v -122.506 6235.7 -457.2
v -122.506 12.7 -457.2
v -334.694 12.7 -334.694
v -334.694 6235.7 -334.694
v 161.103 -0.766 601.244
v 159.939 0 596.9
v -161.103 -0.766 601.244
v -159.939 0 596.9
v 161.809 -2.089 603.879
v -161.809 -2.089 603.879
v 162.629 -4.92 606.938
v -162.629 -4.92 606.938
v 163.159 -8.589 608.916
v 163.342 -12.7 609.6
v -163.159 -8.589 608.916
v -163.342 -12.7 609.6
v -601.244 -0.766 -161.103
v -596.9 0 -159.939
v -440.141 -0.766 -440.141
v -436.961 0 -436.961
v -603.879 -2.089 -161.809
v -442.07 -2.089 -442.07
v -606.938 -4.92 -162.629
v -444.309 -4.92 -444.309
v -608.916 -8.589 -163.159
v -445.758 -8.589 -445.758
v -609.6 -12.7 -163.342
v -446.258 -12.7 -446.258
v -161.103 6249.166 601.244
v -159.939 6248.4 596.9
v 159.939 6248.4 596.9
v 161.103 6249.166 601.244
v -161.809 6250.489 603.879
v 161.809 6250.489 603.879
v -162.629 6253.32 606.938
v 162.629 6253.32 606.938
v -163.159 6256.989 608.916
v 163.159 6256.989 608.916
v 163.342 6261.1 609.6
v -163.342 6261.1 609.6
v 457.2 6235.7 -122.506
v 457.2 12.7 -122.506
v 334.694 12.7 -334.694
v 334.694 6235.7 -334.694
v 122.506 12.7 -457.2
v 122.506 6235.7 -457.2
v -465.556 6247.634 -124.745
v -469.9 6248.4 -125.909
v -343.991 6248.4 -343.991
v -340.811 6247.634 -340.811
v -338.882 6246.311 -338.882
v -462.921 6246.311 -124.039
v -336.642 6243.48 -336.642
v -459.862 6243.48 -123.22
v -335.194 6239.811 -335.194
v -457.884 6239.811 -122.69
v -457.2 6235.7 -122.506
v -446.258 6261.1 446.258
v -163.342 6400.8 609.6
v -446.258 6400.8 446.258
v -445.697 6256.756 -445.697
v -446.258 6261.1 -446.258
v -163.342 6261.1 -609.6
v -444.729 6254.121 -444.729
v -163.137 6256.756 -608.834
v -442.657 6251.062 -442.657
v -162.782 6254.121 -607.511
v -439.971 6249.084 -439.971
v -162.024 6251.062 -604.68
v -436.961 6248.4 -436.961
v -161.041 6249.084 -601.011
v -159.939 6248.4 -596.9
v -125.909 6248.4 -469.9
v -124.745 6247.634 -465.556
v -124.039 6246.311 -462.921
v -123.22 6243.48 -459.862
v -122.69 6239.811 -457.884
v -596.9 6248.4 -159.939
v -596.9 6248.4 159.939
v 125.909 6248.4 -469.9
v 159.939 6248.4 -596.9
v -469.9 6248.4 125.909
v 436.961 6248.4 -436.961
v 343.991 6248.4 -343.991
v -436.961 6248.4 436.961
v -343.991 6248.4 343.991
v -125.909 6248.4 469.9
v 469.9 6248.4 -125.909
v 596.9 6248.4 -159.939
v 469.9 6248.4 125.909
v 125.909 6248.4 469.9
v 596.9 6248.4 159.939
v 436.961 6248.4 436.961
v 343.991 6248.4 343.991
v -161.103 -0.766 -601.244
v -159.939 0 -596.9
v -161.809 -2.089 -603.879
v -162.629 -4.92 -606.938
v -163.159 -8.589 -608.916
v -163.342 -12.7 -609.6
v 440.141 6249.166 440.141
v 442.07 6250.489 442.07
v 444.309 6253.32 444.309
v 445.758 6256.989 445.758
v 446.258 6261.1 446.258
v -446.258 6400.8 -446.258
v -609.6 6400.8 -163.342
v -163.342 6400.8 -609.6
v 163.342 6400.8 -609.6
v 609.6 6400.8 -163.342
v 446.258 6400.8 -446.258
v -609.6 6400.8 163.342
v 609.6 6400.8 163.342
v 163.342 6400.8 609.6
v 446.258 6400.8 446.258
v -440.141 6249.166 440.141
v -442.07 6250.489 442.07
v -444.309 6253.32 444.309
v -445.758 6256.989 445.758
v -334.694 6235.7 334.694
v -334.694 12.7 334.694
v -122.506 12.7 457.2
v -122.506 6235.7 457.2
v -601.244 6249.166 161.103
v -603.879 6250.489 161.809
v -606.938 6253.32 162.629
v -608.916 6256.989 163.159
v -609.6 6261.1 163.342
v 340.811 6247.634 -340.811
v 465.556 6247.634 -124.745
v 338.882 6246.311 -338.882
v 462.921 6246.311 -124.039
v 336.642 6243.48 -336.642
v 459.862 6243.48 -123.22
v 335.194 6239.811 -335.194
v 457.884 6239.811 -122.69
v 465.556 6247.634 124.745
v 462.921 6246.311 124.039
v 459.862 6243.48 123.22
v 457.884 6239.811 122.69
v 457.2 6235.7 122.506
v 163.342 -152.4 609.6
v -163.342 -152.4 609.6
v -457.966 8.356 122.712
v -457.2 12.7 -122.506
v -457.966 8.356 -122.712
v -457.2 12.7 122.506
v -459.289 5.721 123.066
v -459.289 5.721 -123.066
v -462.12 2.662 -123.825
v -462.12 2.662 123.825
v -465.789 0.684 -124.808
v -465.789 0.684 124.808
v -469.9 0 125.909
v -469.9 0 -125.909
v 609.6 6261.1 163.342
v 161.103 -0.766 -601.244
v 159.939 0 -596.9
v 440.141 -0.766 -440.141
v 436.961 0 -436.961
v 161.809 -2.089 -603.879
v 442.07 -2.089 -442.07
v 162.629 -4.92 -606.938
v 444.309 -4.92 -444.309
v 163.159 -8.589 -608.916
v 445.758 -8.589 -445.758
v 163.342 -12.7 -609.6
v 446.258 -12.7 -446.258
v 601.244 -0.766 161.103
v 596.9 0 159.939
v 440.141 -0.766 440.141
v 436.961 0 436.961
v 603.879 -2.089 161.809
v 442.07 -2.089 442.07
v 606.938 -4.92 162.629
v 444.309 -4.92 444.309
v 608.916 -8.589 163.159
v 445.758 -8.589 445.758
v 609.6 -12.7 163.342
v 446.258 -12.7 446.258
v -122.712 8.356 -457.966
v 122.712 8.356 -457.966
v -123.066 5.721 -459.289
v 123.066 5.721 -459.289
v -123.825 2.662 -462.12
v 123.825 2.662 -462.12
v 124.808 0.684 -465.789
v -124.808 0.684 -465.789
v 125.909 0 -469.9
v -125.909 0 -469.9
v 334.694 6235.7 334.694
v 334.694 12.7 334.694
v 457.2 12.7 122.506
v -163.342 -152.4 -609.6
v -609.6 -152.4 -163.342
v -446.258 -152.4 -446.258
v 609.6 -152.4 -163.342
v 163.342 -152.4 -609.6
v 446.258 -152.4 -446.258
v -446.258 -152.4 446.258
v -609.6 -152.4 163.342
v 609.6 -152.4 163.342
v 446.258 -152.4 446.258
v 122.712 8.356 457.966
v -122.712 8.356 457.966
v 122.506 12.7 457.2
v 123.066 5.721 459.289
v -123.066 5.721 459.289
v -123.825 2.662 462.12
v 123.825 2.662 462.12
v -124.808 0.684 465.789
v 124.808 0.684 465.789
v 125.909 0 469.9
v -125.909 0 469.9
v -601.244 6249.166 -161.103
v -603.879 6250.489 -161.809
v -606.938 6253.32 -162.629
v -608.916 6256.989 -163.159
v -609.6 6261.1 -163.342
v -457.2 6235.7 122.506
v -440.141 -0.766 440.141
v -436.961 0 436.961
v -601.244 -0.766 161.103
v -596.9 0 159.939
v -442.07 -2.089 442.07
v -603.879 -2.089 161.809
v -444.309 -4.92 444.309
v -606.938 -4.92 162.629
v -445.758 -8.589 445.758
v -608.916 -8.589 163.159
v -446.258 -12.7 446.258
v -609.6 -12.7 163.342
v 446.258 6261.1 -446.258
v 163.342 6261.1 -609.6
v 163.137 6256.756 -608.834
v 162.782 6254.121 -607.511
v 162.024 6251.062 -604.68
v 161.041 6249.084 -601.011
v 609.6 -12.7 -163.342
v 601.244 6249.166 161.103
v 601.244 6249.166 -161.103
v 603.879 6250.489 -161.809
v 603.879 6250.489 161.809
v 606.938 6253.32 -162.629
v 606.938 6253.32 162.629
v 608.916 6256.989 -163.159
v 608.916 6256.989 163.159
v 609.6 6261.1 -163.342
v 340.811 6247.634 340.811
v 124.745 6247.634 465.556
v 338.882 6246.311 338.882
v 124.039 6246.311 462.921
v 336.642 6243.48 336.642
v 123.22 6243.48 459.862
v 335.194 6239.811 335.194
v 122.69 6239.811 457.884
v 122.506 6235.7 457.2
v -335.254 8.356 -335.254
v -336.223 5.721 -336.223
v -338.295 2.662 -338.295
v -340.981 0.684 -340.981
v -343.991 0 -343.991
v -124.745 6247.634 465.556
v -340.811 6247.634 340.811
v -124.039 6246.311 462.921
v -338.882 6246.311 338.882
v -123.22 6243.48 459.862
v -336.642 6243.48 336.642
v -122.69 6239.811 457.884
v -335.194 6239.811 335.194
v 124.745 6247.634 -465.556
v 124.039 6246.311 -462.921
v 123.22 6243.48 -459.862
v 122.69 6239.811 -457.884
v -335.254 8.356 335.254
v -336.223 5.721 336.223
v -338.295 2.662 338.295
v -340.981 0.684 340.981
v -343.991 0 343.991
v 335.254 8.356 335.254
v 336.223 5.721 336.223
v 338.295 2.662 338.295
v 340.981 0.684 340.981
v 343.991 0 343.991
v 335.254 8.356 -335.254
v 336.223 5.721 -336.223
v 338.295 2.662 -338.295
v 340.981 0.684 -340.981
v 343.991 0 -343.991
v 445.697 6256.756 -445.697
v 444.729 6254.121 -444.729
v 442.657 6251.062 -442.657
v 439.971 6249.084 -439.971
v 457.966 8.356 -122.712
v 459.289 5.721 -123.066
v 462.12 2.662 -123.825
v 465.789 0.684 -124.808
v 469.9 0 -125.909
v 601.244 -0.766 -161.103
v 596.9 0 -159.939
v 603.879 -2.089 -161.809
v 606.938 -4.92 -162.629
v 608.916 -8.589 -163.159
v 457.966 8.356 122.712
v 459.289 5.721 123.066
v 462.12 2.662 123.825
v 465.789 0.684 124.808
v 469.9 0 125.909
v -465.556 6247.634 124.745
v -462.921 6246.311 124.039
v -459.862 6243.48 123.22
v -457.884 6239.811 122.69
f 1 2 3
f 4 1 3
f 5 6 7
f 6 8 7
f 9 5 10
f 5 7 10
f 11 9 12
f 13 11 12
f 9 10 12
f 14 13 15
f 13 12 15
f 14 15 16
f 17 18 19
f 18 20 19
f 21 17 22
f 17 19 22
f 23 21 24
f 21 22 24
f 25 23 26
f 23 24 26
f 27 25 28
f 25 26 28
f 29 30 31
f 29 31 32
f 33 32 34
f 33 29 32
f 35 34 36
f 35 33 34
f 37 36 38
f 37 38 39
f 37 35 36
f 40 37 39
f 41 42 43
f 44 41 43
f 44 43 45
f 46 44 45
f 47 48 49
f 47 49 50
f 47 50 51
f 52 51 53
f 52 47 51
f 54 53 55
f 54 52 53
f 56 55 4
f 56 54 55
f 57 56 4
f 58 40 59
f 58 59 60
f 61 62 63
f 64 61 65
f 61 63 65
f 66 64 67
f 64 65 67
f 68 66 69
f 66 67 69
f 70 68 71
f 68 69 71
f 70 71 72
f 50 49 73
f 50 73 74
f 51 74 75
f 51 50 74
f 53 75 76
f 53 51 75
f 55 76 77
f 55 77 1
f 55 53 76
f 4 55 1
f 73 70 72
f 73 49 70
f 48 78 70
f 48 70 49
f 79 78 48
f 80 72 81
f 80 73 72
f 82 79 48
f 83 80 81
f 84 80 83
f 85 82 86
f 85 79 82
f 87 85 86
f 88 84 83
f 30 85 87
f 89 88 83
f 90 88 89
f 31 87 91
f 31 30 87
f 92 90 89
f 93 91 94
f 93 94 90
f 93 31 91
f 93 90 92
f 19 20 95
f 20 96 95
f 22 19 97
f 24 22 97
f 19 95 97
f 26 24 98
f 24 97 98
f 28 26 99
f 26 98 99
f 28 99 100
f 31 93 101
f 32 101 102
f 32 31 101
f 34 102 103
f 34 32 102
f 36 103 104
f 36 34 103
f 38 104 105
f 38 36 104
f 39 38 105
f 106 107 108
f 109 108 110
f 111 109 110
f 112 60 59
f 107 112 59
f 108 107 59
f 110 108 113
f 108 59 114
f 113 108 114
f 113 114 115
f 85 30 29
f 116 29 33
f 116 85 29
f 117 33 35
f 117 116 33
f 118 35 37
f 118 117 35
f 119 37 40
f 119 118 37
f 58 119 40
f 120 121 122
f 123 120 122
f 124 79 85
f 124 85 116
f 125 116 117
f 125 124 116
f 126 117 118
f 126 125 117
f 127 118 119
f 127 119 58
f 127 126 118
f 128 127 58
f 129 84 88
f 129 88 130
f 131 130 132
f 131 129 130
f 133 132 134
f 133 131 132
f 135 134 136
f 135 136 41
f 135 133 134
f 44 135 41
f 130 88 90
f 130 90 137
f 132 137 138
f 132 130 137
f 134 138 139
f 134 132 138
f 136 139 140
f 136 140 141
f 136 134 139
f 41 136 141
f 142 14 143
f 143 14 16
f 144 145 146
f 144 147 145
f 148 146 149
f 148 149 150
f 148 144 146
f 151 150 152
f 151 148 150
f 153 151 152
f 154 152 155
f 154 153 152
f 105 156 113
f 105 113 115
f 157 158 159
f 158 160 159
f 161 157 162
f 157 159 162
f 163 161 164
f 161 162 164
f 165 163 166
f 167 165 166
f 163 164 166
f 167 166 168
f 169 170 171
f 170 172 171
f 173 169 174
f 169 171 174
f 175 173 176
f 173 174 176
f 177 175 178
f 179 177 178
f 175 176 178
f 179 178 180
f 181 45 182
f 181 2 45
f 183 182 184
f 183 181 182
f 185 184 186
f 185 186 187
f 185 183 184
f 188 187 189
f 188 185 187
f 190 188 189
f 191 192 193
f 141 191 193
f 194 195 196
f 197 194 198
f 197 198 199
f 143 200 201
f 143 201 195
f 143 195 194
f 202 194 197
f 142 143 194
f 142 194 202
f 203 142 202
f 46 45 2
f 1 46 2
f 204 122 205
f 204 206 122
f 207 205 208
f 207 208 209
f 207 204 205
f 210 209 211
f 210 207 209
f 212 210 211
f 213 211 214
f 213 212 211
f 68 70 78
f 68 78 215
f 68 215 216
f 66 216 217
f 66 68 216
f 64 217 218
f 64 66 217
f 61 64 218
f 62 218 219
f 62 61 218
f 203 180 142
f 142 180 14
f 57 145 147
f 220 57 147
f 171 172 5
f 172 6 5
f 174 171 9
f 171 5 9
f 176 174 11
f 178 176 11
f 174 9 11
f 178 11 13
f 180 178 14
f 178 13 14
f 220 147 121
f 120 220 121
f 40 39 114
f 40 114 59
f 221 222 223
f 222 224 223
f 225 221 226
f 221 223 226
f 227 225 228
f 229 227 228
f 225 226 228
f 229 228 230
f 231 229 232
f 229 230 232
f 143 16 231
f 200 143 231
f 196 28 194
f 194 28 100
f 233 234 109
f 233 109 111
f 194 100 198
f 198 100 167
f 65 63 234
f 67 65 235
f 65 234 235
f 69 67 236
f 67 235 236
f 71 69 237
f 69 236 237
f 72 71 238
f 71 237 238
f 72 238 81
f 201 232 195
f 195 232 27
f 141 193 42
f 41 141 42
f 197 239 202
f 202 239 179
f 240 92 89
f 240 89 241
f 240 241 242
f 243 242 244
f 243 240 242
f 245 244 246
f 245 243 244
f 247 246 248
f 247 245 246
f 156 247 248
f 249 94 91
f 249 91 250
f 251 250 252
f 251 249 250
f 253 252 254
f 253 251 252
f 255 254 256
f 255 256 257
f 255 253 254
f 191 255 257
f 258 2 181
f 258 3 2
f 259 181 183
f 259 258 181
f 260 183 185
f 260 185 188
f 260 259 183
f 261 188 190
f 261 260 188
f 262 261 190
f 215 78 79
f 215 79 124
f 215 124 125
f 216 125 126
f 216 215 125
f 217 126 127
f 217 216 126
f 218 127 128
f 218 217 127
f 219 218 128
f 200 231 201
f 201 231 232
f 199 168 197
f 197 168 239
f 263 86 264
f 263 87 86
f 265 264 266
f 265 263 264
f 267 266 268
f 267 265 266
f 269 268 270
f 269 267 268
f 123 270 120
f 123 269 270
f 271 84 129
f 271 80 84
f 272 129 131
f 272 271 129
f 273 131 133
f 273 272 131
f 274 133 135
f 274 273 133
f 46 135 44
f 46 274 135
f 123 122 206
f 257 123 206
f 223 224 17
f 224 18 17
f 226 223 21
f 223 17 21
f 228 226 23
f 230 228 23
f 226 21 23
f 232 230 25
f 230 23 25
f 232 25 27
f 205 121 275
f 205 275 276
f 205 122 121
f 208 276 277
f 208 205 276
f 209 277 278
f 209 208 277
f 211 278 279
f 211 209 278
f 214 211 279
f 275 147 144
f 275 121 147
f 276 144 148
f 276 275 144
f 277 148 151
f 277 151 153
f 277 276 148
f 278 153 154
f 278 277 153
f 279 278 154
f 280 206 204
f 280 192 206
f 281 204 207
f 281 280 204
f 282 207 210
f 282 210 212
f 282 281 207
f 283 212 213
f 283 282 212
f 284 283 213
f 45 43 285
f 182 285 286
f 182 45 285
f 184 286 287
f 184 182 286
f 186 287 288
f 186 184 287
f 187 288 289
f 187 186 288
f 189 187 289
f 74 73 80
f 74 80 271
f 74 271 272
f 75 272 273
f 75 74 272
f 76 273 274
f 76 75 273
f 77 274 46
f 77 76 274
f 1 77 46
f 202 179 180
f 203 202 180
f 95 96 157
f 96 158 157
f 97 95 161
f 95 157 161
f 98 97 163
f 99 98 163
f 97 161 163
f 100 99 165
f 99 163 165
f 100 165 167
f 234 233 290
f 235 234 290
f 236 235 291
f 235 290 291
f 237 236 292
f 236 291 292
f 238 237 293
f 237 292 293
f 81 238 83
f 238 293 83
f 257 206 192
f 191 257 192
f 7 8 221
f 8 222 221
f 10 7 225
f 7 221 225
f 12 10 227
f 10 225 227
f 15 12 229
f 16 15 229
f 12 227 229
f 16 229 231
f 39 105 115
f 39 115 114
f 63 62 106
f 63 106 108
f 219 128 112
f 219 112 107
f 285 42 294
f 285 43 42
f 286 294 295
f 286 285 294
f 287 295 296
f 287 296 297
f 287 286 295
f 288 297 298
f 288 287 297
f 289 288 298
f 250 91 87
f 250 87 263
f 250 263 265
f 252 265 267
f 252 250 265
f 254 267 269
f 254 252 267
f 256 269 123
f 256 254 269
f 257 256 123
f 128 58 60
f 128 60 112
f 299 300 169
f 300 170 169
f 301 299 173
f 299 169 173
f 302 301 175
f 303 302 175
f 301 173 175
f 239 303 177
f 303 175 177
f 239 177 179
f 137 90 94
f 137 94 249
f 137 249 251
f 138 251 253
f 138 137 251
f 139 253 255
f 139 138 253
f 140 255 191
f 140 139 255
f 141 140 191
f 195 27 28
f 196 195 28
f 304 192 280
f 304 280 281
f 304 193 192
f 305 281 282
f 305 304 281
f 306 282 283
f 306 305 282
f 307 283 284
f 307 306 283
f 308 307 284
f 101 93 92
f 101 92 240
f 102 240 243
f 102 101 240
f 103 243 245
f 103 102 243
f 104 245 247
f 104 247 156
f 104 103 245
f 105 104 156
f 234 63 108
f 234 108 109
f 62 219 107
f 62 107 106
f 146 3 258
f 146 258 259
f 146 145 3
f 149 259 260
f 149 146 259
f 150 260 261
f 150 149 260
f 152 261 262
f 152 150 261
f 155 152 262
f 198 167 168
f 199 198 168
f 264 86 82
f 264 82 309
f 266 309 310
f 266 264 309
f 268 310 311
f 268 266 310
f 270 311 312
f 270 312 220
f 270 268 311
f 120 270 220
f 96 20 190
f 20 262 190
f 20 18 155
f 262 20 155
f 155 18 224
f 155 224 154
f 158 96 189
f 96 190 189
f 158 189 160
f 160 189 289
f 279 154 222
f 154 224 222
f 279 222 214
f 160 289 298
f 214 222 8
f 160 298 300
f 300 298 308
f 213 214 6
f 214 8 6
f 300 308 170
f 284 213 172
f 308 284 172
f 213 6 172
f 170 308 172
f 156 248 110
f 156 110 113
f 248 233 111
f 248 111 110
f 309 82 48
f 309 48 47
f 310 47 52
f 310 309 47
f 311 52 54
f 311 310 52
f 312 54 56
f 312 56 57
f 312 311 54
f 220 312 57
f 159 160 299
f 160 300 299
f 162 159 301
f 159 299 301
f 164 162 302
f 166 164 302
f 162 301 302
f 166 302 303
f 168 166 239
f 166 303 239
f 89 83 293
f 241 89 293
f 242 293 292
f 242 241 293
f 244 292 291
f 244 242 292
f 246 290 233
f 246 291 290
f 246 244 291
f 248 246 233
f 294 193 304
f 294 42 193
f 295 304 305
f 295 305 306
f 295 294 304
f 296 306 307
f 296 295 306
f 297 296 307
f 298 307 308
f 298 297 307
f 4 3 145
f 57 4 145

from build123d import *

# Parameters (mm, degrees)
SUPPORT_BASE_DEPTH   = 6248.4
BOTTOM_EXTRUDE_DEPTH = 152.4
FACE_FILLET_R        = 12.7


with BuildPart() as part:
    # Sketch1 → Support Base (new body)
    with BuildSketch(Plane(origin=(0, 0, 0), x_dir=(1, 0, 0), z_dir=(0, 1, 0))):
        Polygon((-122.50637078, 457.2), (-334.69362922, 334.69362922), (-457.2, 122.50637078), (-457.2, -122.50637078), (-334.69362922, -334.69362922), (-122.50637078, -457.2), (122.50637078, -457.2), (334.69362922, -334.69362922), (457.2, -122.50637078), (457.2, 122.50637078), (334.69362922, 334.69362922), (122.50637078, 457.2), align=None)
    extrude(amount=SUPPORT_BASE_DEPTH)

    # Sketch2 → Bottom Extrude (add)
    with BuildSketch(Plane.XZ):
        Polygon((-163.341827706, -609.6), (163.341827706, -609.6), (446.258172294, -446.258172294), (609.6, -163.341827706), (609.6, 163.341827706), (446.258172294, 446.258172294), (163.341827706, 609.6), (-163.341827706, 609.6), (-446.258172294, 446.258172294), (-609.6, 163.341827706), (-609.6, -163.341827706), (-446.258172294, -446.258172294), align=None)
    bottom_extrude = extrude(amount=BOTTOM_EXTRUDE_DEPTH)

    # Top Extrude: Bottom Extrude across plane
    add(bottom_extrude.mirror(Plane.ZX.offset(3124.2)))

    # Face Fillet
    face_fillet_edges = [part.edges().sort_by_distance(p)[0] for p in [
        (-395.94681461, 6248.4, -228.6),
        (228.6, 0, -395.94681461),
        (395.94681461, 0, -228.6),
        (457.2, 0, 0),
        (395.94681461, 0, 228.6),
        (228.6, 0, 395.94681461),
        (0, 0, 457.2),
        (-457.2, 6248.4, 0),
        (-228.6, 0, 395.94681461),
        (-395.94681461, 0, 228.6),
        (-457.2, 0, 0),
        (-395.94681461, 0, -228.6),
        (-228.6, 0, -395.94681461),
        (0, 0, -457.2),
        (-395.94681461, 6248.4, 228.6),
        (-228.6, 6248.4, 395.94681461),
        (0, 6248.4, 457.2),
        (228.6, 6248.4, 395.94681461),
        (395.94681461, 6248.4, 228.6),
        (457.2, 6248.4, 0),
        (395.94681461, 6248.4, -228.6),
        (-304.8, 0, -527.929086147),
        (0, 0, -609.6),
        (304.8, 0, -527.929086147),
        (527.929086147, 0, -304.8),
        (228.6, 6248.4, -395.94681461),
        (609.6, 0, 0),
        (527.929086147, 0, 304.8),
        (304.8, 0, 527.929086147),
        (0, 0, 609.6),
        (-304.8, 0, 527.929086147),
        (-527.929086147, 0, 304.8),
        (-609.6, 0, 0),
        (0, 6248.4, -457.2),
        (-527.929086147, 0, -304.8),
        (-304.8, 6248.4, -527.929086147),
        (0, 6248.4, -609.6),
        (304.8, 6248.4, -527.929086147),
        (527.929086147, 6248.4, -304.8),
        (609.6, 6248.4, 0),
        (527.929086147, 6248.4, 304.8),
        (304.8, 6248.4, 527.929086147),
        (0, 6248.4, 609.6),
        (-304.8, 6248.4, 527.929086147),
        (-527.929086147, 6248.4, 304.8),
        (-609.6, 6248.4, 0),
        (-228.6, 6248.4, -395.94681461),
        (-527.929086147, 6248.4, -304.8),
    ]]
    fillet(face_fillet_edges, radius=FACE_FILLET_R)


solid = part.part
